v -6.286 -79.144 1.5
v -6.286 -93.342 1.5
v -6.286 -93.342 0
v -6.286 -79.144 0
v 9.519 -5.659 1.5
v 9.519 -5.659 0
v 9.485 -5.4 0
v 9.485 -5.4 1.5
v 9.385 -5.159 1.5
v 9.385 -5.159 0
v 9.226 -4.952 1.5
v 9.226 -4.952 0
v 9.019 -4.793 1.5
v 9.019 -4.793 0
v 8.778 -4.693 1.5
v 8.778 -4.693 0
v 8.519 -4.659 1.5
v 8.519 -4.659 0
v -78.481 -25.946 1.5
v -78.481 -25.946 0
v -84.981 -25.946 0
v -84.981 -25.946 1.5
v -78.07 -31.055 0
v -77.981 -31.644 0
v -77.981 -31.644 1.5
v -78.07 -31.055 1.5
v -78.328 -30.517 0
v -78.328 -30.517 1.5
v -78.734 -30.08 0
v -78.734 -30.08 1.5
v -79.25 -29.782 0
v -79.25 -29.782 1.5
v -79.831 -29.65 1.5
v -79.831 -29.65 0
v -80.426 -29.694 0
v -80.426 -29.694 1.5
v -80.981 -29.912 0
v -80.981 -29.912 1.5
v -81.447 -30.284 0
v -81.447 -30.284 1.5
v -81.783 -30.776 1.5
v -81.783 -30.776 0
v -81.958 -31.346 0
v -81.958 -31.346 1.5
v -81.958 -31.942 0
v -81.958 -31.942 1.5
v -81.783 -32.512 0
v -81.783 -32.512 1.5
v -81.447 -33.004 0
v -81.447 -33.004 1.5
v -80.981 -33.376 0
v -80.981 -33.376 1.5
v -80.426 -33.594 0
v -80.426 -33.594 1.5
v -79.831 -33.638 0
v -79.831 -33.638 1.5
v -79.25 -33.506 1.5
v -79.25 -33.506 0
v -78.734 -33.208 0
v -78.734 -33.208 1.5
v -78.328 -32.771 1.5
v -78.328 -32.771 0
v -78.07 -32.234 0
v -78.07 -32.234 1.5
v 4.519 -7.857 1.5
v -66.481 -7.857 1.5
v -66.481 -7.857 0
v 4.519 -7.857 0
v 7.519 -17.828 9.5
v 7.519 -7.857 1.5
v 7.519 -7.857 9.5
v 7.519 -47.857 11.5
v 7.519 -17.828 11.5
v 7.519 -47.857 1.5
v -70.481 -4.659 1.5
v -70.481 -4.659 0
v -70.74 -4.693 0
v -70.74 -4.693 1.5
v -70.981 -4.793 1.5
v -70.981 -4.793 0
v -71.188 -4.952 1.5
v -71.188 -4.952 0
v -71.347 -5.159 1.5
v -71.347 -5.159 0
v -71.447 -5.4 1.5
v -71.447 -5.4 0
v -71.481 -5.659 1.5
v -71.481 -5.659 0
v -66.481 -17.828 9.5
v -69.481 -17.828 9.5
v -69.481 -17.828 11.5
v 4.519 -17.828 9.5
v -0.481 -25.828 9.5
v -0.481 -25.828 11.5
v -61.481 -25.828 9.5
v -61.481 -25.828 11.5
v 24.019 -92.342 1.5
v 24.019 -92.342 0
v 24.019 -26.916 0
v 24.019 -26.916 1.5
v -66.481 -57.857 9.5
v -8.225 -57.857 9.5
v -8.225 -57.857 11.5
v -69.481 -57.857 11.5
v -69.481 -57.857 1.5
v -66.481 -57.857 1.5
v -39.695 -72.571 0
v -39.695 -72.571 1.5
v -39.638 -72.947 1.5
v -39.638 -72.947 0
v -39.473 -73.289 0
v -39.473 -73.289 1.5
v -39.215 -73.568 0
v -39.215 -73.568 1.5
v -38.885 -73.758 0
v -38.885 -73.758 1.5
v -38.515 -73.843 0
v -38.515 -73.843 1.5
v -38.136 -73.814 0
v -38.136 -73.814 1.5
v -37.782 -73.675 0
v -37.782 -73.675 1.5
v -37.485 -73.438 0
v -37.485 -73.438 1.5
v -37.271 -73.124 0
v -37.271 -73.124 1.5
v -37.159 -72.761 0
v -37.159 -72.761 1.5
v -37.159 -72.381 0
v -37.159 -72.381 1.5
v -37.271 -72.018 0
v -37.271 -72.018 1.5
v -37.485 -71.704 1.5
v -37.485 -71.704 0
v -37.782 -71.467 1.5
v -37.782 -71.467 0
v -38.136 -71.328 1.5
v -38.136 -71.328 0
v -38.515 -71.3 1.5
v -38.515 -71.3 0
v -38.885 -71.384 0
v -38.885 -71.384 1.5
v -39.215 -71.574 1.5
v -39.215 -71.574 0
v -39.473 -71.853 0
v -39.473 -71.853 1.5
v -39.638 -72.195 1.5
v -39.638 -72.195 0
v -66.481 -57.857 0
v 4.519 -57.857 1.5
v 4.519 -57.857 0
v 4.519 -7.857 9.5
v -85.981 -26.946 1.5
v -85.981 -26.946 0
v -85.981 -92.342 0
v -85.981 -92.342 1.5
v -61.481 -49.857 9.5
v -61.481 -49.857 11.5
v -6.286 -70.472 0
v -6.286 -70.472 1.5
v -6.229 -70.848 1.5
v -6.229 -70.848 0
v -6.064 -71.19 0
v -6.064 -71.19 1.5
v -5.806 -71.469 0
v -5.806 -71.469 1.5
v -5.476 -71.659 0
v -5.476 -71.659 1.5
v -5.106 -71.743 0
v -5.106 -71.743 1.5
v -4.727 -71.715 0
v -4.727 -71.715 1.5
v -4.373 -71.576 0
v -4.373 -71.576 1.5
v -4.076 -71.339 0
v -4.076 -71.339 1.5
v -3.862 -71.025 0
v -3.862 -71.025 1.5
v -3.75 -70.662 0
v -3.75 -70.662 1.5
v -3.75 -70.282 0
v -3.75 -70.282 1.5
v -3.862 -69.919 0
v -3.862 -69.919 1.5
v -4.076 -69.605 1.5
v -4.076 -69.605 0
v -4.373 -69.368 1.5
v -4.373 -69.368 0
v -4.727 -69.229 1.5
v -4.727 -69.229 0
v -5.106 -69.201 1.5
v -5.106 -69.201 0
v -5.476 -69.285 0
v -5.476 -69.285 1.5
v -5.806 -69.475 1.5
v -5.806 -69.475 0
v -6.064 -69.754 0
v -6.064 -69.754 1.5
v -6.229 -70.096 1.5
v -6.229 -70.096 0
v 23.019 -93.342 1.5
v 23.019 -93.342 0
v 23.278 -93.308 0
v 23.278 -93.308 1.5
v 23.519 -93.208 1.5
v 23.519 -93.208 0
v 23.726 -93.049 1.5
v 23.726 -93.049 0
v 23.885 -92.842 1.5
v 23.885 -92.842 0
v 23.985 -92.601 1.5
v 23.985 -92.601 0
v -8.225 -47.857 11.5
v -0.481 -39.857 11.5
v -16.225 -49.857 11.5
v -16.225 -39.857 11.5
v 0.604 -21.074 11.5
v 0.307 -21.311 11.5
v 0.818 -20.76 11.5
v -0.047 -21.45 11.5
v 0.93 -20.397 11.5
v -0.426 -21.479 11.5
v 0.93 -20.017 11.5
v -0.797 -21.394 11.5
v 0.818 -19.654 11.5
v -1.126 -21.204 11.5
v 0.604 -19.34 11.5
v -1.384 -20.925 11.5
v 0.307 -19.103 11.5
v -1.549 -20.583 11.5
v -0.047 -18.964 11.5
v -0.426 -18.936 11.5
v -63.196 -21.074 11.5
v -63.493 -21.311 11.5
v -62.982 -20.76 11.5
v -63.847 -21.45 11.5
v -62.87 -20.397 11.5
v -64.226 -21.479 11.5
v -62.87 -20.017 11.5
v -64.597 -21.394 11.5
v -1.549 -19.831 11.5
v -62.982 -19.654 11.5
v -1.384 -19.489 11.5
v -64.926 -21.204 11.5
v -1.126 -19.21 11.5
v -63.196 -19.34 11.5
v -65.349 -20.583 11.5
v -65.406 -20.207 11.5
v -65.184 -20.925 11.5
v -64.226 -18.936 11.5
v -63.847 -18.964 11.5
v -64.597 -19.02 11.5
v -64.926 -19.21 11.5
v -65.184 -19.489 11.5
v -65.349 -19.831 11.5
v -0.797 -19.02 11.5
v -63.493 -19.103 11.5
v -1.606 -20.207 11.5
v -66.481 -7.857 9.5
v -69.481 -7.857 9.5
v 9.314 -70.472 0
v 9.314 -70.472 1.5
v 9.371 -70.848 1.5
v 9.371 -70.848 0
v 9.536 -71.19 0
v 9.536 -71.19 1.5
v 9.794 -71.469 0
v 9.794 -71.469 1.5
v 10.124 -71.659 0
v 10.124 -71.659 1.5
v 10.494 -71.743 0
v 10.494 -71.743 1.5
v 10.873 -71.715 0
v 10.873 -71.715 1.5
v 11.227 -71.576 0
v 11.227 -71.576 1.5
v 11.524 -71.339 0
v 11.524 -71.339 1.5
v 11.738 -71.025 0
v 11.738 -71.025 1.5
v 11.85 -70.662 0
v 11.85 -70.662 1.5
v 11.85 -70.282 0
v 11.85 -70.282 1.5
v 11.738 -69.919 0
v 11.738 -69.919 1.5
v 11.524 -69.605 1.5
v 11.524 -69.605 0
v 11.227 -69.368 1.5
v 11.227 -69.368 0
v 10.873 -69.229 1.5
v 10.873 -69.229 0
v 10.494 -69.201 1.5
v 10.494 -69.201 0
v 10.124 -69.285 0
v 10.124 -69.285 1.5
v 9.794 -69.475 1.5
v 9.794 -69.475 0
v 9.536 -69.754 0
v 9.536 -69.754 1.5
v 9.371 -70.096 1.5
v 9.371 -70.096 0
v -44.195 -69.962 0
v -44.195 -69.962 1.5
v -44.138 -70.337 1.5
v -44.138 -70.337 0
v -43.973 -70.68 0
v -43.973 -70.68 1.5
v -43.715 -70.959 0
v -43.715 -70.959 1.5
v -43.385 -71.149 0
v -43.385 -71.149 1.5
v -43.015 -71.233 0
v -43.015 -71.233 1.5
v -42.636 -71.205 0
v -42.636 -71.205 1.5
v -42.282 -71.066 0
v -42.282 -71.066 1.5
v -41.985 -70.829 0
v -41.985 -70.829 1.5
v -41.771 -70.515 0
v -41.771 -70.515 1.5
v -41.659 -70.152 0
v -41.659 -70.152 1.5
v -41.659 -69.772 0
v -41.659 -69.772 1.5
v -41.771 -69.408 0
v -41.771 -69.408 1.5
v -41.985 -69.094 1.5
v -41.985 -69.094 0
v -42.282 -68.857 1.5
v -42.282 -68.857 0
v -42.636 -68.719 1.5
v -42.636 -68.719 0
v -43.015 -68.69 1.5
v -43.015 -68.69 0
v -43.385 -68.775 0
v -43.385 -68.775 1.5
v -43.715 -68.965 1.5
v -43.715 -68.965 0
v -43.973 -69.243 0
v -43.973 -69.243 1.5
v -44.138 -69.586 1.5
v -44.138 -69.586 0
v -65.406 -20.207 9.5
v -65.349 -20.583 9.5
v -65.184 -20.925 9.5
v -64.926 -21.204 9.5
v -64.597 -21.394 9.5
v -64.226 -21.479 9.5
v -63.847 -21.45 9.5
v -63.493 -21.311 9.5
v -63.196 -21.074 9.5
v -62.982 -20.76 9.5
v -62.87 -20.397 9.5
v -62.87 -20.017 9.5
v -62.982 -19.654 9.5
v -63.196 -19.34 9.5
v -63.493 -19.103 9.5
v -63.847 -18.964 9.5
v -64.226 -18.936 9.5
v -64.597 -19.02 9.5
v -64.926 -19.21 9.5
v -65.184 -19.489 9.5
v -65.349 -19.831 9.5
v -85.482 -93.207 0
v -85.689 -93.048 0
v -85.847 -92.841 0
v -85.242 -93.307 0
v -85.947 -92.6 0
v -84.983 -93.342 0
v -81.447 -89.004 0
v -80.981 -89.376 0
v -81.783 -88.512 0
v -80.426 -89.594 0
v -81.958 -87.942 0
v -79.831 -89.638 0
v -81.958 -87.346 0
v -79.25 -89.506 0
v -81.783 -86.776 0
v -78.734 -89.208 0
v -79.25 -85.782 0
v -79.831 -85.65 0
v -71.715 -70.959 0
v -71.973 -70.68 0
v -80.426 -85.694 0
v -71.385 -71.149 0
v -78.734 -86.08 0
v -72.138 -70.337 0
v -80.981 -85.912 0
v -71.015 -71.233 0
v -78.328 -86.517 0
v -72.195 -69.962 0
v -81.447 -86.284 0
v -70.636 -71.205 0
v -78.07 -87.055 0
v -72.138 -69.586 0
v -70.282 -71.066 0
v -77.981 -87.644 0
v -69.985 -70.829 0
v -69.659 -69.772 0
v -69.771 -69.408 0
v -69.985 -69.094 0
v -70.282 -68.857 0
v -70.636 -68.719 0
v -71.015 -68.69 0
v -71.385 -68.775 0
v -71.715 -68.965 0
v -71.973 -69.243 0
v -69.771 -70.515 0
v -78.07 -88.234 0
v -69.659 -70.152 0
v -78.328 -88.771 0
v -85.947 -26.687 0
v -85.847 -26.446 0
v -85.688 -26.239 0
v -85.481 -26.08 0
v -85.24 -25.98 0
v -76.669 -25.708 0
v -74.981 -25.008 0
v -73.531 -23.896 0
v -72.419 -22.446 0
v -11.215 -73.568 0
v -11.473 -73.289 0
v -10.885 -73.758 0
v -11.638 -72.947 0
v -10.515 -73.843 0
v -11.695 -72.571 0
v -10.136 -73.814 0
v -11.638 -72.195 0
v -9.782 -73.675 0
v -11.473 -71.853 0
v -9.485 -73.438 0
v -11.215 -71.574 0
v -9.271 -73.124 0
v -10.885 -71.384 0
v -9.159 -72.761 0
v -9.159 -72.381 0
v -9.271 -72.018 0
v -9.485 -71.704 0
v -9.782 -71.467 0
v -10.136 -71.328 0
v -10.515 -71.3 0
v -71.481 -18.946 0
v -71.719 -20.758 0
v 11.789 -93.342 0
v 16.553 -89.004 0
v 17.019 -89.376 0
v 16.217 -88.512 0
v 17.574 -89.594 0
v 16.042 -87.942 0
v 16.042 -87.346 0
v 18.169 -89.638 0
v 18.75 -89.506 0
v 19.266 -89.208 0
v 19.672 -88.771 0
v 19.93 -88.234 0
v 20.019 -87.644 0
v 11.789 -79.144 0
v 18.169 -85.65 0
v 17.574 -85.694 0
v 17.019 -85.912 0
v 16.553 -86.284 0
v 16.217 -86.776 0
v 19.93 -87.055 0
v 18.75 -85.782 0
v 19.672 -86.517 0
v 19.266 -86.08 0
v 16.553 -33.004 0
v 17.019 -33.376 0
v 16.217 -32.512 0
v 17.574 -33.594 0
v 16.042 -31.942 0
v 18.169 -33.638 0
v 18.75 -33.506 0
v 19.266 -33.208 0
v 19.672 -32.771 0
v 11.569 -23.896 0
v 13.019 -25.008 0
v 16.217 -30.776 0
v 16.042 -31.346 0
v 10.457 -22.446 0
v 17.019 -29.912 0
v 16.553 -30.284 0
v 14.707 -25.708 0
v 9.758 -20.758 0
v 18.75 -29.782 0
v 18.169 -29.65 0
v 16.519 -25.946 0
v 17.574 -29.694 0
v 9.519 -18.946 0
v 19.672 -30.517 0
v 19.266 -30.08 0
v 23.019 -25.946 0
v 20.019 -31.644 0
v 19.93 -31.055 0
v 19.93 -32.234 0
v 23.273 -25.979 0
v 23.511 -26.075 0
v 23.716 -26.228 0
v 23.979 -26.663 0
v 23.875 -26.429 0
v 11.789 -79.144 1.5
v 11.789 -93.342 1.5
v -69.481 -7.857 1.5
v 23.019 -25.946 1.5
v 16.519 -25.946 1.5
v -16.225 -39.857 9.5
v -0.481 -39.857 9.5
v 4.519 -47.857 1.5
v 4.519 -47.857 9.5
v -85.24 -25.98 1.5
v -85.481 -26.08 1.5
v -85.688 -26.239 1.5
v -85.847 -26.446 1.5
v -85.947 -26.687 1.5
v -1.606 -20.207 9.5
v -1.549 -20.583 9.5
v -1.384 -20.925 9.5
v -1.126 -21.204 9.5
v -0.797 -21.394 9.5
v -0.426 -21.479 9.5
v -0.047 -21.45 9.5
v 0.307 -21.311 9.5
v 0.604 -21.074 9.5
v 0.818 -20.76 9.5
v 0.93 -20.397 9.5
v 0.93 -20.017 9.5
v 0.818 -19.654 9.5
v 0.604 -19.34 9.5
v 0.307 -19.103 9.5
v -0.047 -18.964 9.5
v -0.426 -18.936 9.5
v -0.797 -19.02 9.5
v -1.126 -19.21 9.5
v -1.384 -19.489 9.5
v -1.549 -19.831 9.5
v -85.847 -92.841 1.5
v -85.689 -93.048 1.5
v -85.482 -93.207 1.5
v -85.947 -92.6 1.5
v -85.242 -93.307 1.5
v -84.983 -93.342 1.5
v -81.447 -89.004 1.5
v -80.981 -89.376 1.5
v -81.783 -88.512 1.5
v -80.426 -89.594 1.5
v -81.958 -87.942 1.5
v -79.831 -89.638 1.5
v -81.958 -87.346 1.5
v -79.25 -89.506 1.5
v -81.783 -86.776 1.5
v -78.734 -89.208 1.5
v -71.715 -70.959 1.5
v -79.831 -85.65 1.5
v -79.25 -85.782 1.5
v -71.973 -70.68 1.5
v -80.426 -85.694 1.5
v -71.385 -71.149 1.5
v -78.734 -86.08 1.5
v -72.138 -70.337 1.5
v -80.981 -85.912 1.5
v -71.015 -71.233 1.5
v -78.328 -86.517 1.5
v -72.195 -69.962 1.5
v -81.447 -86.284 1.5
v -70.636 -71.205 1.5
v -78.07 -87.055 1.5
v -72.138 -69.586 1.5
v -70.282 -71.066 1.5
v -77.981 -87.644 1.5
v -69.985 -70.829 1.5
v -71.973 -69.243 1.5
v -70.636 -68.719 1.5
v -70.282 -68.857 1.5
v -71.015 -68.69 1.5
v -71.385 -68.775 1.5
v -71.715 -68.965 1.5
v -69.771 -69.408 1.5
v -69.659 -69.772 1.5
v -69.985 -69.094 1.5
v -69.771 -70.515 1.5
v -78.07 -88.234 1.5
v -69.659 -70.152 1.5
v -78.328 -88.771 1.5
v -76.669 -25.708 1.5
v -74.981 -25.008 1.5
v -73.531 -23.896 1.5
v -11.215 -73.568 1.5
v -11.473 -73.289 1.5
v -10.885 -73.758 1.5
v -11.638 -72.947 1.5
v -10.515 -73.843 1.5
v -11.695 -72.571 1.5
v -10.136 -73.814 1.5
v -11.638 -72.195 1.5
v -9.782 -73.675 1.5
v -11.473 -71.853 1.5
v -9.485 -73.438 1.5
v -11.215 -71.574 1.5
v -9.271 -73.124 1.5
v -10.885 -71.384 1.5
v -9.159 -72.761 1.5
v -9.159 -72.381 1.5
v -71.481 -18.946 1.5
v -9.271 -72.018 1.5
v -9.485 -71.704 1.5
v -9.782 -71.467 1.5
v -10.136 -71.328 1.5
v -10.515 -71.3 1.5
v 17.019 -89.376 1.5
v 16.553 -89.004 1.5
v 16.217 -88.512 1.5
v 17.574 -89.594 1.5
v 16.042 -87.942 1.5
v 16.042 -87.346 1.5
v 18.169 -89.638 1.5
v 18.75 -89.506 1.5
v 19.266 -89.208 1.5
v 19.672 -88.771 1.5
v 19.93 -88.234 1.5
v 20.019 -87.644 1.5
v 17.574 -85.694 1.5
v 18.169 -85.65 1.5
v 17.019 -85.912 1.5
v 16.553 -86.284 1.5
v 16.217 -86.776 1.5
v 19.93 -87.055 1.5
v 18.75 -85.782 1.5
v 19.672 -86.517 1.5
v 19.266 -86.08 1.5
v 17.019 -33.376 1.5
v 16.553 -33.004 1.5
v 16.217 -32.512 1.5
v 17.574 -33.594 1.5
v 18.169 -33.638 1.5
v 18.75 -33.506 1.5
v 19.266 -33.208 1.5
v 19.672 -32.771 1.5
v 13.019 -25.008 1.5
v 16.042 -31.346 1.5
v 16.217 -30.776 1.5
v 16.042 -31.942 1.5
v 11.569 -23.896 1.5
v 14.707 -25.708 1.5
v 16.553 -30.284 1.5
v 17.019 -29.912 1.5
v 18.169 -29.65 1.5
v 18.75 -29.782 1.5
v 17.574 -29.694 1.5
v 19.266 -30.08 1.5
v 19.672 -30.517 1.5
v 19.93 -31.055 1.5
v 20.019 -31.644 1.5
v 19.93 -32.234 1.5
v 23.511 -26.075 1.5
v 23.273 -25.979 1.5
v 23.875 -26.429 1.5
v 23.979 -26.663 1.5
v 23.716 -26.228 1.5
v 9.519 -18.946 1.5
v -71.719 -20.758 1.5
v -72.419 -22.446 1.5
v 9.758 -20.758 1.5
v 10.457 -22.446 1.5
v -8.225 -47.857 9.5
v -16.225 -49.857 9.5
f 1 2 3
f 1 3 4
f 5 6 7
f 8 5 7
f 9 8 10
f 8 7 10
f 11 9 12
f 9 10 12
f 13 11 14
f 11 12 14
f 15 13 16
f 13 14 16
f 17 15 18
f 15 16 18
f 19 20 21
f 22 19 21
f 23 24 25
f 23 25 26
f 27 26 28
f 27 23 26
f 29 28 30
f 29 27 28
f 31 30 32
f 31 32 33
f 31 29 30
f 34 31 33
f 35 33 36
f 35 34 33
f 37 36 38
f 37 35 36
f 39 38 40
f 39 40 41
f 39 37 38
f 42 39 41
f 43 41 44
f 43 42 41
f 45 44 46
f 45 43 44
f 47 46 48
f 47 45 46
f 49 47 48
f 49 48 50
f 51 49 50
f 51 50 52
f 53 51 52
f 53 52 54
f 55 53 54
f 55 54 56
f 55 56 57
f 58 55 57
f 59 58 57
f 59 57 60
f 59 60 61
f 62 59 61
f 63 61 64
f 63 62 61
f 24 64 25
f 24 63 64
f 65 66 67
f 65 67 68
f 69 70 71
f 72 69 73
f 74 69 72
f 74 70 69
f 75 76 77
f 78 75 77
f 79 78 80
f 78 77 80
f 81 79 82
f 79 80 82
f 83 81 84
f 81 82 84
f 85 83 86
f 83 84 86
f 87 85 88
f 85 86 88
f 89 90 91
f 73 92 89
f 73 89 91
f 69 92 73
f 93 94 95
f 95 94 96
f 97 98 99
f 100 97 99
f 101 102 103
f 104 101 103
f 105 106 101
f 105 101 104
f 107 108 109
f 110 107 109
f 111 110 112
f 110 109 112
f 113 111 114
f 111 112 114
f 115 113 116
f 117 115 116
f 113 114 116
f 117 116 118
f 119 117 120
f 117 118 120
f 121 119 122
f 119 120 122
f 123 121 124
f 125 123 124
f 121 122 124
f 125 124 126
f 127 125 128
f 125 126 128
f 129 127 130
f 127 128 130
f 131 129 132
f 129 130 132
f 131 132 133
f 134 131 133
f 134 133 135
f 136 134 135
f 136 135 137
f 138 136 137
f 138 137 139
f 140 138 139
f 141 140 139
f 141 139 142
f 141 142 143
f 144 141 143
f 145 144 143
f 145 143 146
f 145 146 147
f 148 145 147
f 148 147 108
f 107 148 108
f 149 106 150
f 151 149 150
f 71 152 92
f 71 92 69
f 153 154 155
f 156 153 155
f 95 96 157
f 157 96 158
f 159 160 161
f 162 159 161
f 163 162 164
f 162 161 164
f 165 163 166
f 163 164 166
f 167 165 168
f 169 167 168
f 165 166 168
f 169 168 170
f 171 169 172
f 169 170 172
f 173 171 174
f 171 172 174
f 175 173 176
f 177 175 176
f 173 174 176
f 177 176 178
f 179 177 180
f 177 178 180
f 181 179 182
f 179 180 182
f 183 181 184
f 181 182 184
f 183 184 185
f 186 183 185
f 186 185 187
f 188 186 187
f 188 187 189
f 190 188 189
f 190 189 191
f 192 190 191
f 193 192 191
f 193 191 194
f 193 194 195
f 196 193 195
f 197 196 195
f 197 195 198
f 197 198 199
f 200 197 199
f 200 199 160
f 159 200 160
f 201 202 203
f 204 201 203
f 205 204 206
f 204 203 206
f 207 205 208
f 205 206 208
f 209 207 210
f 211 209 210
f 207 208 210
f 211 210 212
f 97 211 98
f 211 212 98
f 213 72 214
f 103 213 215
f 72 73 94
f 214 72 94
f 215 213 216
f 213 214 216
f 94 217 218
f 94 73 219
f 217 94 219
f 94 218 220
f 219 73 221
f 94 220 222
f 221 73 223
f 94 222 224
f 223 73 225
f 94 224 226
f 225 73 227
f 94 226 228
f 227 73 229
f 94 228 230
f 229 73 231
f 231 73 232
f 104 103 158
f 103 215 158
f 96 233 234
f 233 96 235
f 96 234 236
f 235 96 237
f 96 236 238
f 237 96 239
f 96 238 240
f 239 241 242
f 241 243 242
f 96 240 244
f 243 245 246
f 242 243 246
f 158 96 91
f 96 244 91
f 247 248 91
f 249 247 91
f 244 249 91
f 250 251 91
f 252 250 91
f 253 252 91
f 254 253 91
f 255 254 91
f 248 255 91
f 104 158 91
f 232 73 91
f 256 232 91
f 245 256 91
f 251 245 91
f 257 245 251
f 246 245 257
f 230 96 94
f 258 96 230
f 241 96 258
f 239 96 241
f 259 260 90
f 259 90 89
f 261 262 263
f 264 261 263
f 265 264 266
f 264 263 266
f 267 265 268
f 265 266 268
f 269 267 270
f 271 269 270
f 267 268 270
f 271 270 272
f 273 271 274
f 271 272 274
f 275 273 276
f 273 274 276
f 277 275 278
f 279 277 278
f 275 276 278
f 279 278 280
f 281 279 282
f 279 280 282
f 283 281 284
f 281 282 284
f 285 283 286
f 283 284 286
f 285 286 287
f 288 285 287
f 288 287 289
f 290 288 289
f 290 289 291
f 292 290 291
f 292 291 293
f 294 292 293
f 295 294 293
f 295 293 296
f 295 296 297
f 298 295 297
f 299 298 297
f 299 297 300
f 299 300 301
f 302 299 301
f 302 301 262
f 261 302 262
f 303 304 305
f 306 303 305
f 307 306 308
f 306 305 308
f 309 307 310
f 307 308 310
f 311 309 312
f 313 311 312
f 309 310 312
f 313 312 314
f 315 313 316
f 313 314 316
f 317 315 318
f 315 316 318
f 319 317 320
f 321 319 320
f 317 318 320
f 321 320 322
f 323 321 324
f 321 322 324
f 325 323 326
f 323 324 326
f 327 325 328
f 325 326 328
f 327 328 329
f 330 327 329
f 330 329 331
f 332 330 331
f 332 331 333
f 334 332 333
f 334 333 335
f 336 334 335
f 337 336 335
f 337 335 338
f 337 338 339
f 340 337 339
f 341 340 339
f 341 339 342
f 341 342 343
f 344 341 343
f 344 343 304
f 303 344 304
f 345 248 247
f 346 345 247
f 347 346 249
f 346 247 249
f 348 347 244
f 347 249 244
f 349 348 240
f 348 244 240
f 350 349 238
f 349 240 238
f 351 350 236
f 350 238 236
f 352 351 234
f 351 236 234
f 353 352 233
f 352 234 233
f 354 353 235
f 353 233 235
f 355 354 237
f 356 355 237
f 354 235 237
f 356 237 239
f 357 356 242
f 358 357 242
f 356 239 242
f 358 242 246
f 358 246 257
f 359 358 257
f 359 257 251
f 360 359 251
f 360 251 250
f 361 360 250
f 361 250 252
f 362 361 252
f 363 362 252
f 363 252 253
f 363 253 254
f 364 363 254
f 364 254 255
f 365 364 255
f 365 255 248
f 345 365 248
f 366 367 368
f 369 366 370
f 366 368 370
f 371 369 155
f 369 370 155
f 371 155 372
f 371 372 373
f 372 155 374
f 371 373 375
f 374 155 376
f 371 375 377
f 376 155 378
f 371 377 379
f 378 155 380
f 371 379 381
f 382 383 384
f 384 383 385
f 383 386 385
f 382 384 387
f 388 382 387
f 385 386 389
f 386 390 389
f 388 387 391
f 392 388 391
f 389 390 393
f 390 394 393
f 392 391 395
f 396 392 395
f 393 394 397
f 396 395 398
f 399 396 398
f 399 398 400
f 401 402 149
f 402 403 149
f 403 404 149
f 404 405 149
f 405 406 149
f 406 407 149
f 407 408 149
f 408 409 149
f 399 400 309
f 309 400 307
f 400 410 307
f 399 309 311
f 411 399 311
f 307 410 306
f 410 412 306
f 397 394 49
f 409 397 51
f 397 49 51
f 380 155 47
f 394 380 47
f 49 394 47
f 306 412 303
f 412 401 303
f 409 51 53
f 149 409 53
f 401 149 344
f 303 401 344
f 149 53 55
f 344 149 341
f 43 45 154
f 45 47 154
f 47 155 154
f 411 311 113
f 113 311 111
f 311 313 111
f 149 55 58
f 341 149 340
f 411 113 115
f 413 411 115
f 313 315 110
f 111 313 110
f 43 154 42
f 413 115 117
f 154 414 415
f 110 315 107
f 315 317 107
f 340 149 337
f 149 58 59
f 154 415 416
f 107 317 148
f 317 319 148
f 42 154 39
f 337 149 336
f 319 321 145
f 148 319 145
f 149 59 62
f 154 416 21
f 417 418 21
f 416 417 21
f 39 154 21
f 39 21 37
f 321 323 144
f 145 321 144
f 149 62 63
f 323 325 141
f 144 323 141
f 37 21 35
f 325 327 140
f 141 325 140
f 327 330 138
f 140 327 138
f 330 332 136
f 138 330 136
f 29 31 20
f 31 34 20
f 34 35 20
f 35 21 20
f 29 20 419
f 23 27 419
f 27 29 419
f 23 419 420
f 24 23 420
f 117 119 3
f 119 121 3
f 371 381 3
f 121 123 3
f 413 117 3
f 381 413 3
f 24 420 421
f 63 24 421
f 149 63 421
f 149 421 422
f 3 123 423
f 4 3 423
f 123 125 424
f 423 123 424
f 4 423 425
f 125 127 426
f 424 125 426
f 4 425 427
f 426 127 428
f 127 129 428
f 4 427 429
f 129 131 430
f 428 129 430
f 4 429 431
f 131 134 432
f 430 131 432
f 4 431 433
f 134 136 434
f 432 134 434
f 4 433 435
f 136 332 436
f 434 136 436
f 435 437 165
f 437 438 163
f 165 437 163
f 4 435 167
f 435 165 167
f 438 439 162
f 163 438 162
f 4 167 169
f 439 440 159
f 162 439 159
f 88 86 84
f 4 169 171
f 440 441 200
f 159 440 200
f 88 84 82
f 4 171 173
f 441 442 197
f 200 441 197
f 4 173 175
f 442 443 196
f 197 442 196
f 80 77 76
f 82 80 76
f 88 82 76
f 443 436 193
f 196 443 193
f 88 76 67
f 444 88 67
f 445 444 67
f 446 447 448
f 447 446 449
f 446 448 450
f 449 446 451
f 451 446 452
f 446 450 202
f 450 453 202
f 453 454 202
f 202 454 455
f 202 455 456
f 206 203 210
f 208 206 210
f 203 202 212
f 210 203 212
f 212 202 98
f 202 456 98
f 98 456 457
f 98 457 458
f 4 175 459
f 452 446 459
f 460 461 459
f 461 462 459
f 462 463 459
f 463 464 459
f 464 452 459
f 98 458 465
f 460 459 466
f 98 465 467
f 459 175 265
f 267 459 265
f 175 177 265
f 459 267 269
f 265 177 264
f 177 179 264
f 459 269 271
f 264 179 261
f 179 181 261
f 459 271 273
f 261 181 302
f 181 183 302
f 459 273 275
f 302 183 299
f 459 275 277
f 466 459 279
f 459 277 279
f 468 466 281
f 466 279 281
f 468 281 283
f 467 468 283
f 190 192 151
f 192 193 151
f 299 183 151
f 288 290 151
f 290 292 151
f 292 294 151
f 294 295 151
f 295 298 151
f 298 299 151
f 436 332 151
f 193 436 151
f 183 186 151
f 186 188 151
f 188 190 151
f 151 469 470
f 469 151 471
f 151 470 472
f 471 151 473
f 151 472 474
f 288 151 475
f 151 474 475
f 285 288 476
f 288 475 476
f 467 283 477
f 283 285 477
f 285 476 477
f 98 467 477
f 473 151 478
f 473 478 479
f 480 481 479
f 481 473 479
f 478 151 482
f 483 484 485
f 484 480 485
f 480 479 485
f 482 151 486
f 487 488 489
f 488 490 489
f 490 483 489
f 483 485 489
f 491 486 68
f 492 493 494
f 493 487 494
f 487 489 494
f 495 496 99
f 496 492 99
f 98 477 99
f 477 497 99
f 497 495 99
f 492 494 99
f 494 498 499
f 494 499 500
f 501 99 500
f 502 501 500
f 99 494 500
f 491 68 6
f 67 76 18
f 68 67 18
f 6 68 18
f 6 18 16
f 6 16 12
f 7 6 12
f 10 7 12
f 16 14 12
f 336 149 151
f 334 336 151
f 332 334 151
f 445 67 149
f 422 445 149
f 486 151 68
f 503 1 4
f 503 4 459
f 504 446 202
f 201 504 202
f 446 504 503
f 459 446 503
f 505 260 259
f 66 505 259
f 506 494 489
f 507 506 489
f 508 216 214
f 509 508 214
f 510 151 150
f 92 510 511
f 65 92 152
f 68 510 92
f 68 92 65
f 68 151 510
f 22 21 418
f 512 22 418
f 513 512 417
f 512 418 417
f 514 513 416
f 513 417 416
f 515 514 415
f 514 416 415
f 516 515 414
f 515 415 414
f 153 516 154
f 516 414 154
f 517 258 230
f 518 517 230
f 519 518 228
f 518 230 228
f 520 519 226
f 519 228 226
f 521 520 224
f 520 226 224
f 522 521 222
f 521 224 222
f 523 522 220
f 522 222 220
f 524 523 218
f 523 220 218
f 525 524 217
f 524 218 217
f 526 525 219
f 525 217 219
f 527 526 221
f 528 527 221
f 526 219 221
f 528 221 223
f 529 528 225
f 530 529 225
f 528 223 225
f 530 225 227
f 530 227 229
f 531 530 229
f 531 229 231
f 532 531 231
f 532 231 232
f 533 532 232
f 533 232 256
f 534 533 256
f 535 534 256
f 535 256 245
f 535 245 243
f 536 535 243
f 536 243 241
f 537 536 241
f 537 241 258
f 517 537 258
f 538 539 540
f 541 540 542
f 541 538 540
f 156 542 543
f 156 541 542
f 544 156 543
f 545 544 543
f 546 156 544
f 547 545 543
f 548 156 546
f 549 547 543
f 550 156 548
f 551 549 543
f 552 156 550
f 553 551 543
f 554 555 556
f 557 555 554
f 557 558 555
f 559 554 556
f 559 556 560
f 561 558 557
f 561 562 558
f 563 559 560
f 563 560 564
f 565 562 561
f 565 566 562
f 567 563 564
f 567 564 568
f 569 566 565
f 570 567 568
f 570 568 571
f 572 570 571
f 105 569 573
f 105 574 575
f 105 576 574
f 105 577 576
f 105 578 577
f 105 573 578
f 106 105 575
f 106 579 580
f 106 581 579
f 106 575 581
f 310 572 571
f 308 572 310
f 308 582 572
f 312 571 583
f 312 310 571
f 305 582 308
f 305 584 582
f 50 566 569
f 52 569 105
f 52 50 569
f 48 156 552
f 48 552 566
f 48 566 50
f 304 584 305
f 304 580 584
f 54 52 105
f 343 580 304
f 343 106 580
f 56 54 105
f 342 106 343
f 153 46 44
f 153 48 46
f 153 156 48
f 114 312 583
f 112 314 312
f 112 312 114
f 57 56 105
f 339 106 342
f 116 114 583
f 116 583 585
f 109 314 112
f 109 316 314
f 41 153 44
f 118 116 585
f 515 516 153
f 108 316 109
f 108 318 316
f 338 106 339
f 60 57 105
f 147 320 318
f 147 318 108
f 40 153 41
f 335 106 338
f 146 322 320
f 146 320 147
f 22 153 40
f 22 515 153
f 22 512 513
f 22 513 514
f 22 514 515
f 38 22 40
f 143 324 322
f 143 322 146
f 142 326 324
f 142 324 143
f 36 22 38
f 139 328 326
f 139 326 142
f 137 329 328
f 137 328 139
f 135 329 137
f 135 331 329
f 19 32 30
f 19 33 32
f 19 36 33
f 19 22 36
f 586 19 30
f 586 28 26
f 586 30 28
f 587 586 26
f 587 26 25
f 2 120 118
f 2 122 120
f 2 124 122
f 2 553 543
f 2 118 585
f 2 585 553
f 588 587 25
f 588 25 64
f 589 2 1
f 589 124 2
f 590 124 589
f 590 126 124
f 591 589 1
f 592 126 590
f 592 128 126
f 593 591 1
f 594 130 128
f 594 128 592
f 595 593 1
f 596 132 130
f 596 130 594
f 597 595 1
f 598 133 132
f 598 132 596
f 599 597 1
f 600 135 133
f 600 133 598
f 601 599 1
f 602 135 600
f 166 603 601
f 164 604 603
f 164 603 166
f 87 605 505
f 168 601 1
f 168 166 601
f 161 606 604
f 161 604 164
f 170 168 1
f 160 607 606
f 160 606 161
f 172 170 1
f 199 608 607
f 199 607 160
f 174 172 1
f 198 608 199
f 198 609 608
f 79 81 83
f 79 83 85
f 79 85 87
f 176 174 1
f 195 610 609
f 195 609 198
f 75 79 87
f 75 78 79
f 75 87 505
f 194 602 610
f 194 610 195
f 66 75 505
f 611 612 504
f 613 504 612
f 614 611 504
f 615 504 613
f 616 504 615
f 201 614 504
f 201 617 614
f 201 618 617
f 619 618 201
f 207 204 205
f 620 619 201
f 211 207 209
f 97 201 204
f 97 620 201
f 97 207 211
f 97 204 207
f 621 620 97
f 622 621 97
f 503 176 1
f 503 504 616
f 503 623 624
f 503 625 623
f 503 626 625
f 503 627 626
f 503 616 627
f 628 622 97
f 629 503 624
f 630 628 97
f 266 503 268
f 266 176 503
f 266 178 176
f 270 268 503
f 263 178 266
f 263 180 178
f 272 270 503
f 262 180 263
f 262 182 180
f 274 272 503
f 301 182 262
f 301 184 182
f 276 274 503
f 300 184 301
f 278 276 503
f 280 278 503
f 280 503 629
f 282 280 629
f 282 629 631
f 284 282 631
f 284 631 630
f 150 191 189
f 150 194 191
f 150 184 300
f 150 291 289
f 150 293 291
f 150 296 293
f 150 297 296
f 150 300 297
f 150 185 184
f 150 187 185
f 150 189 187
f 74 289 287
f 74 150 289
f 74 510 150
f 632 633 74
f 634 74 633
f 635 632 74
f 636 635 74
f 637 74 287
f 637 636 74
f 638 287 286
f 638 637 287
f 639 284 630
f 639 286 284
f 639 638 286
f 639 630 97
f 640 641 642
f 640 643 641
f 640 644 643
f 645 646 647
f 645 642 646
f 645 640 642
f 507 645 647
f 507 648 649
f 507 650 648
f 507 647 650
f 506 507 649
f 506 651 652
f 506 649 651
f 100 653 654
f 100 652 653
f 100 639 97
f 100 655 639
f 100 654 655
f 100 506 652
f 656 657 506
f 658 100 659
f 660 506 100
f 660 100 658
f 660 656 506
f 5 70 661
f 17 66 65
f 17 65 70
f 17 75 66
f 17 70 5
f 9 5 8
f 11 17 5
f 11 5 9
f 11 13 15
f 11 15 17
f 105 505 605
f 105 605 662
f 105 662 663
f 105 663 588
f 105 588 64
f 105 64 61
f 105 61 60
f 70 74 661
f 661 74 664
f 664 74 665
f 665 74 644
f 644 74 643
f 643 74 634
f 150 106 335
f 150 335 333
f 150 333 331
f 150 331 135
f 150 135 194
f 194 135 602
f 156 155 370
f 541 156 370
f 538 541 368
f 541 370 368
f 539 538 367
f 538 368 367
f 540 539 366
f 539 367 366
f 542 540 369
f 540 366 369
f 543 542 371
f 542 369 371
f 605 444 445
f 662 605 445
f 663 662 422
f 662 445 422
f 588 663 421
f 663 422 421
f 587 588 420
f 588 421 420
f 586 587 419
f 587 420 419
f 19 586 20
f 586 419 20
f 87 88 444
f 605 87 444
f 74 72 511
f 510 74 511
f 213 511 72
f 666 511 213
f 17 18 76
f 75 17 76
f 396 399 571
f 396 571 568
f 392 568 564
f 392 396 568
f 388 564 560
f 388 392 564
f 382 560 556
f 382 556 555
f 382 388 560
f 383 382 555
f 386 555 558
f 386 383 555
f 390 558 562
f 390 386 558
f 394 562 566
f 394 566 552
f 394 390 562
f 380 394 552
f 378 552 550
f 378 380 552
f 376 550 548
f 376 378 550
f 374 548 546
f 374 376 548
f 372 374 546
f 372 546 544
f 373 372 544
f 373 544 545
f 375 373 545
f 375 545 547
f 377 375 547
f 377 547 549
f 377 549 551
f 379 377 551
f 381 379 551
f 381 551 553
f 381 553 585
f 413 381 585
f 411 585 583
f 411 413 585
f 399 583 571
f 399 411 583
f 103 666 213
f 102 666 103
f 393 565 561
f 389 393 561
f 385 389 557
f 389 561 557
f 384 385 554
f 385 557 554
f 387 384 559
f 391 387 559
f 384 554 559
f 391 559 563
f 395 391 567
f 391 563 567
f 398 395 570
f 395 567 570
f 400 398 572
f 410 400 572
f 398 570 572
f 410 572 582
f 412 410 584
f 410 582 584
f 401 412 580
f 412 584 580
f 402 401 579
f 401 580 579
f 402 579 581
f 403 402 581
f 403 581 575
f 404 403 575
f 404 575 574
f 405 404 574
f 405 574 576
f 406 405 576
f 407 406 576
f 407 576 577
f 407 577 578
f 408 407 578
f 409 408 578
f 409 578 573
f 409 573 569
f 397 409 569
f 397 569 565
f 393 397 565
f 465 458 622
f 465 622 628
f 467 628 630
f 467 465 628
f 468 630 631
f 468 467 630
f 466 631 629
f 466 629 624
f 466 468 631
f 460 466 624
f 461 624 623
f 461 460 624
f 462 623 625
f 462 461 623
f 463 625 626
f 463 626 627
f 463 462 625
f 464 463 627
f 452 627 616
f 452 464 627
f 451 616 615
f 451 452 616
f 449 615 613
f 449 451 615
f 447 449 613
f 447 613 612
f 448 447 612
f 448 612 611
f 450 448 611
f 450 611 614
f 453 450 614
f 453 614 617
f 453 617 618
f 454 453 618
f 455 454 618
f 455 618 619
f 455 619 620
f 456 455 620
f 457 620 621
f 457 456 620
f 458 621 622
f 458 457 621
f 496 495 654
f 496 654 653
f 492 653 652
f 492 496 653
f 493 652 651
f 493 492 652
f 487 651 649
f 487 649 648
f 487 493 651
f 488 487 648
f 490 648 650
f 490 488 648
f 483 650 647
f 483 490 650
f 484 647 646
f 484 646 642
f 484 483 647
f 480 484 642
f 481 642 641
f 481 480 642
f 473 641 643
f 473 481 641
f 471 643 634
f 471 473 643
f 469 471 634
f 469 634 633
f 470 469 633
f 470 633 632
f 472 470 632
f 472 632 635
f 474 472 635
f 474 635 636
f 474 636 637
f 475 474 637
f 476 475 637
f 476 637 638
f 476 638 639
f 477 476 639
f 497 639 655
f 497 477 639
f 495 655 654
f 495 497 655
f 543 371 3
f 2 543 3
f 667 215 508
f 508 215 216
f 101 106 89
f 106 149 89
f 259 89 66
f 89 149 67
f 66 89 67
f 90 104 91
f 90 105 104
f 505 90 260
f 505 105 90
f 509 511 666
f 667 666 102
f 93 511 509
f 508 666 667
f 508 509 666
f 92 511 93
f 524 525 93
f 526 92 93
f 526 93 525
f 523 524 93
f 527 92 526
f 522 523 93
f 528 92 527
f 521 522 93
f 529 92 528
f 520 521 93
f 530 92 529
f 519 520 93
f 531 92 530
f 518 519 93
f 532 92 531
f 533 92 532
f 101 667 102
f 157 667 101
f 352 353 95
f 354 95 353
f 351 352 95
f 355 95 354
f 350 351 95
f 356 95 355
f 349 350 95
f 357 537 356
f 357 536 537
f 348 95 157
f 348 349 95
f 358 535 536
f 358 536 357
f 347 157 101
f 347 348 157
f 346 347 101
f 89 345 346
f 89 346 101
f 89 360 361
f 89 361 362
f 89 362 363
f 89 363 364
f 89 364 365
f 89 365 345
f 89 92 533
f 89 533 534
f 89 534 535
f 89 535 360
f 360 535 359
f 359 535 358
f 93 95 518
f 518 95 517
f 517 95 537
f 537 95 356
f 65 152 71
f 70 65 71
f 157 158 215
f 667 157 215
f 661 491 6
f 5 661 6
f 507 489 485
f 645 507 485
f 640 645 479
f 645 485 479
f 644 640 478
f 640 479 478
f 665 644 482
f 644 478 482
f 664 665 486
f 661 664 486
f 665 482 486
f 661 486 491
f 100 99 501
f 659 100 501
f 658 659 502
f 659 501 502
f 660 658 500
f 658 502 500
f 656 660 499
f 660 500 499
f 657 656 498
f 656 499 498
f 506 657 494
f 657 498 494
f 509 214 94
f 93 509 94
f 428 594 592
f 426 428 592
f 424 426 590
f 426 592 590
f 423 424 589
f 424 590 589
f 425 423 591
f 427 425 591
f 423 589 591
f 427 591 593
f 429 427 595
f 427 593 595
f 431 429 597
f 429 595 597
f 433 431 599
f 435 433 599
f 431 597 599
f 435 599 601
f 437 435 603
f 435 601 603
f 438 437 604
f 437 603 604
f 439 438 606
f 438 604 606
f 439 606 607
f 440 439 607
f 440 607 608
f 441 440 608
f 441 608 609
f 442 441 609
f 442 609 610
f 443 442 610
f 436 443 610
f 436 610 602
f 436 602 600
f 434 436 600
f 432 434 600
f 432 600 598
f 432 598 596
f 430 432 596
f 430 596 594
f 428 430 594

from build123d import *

# Parameters (mm, degrees)
SKETCH_1_R           = 2
EXTRUDE_1_DEPTH      = 1.5
SKETCH_2_W           = 3
SKETCH_2_H           = 50
SKETCH_2_H_2         = 40
EXTRUDE_3_DEPTH      = 8
EXTRUDE_4_DEPTH      = 2
SKETCH_4_W           = 71.000000198
SKETCH_4_H           = 50
CUT_EXTRUDE_1_DEPTH  = 128.300477144
CUT_EXTRUDE_3_DEPTH  = 128.427082997
SKETCH_11_W          = 18.075
SKETCH_11_H          = 14.197672296
CUT_EXTRUDE_4_DEPTH  = 128.300477144
HOLE_WIZARD_M2_5_1_D = 2.55


with BuildPart() as part:
    # 草圖1 → 填料-伸長1 (new body)
    with BuildSketch(Plane.XY):
        with BuildLine():
            Line((-78.58357781, -93.341907955), (16.519190028, -93.341907955))
            Line((16.519190028, -93.341907955), (23.019189929, -93.341907955))
            ThreePointArc((23.019189929, -93.341907955), (23.72629671, -93.049014736), (24.019189929, -92.341907955))
            Line((24.019189929, -92.341907955), (24.019189929, -26.916101175))
            ThreePointArc((24.019189929, -26.916101175), (23.715868617, -26.228364762), (23.019189929, -25.946187519))
            Line((23.019189929, -25.946187519), (16.519190028, -25.946187519))
            ThreePointArc((16.519190028, -25.946187519), (11.569442559, -23.895934988), (9.519190028, -18.946187519))
            Line((9.519190028, -18.946187519), (9.519190028, -5.659090909))
            ThreePointArc((9.519190028, -5.659090909), (9.226296809, -4.951984128), (8.519190028, -4.659090909))
            Line((8.519190028, -4.659090909), (-70.48081017, -4.659090909))
            ThreePointArc((-70.48081017, -4.659090909), (-71.187916951, -4.951984128), (-71.48081017, -5.659090909))
            Line((-71.48081017, -5.659090909), (-71.48081017, -18.946187519))
            ThreePointArc((-71.48081017, -18.946187519), (-73.531062702, -23.895934988), (-78.48081017, -25.946187519))
            Line((-78.48081017, -25.946187519), (-84.980810071, -25.946187519))
            ThreePointArc((-84.980810071, -25.946187519), (-85.687916853, -26.239080738), (-85.980810071, -26.946187519))
            Line((-85.980810071, -26.946187519), (-85.980810071, -92.341911374))
            ThreePointArc((-85.980810071, -92.341911374), (-85.688840793, -93.048093006), (-84.983425077, -93.341907955))
            Line((-84.983425077, -93.341907955), (-78.58357781, -93.341907955))
        make_face()
        with Locations((-79.980810071, -31.644049447)):
            Circle(SKETCH_1_R, mode=Mode.SUBTRACT)
        with Locations((18.019189929, -31.644049447)):
            Circle(SKETCH_1_R, mode=Mode.SUBTRACT)
        with Locations((18.019189929, -87.644049447)):
            Circle(SKETCH_1_R, mode=Mode.SUBTRACT)
        with Locations((-79.980810071, -87.644049447)):
            Circle(SKETCH_1_R, mode=Mode.SUBTRACT)
    extrude(amount=EXTRUDE_1_DEPTH)

    # 草圖2 → 填料-伸長3 (add)
    with BuildSketch(Plane.XY.offset(1.5)):
        with Locations((-67.98081017, -32.85713984)):
            Rectangle(SKETCH_2_W, SKETCH_2_H)
        with Locations((6.019190028, -27.85713984)):
            Rectangle(SKETCH_2_W, SKETCH_2_H_2)
    extrude(amount=EXTRUDE_3_DEPTH)

    # 草圖3 → 填料-伸長4 (add)
    with BuildSketch(Plane.XY.offset(9.5)):
        Polygon((-69.48081017, -17.828011501), (7.519190028, -17.828011501), (7.519190028, -47.85713984), (-8.225095928, -47.85713984), (-8.225095928, -57.85713984), (-69.48081017, -57.85713984), align=None)
    extrude(amount=EXTRUDE_4_DEPTH)

    # 草圖4 → 除料-伸長1 (cut, through all)
    with BuildSketch(Plane.XY.offset(1.5)):
        with Locations((-30.980810071, -32.85713984)):
            Rectangle(SKETCH_4_W, SKETCH_4_H)
    extrude(amount=-CUT_EXTRUDE_1_DEPTH, mode=Mode.SUBTRACT)

    # 草圖7 → 除料-伸長3 (cut, through all)
    with BuildSketch(Plane.XY.offset(11.5)):
        Polygon((-16.225095928, -49.85713984), (-16.225095928, -39.85713984), (-0.480809972, -39.85713984), (-0.480809972, -25.828011501), (-61.48081017, -25.828011501), (-61.48081017, -49.85713984), align=None)
    extrude(amount=-CUT_EXTRUDE_3_DEPTH, mode=Mode.SUBTRACT)

    # 草圖11 → 除料-伸長4 (cut, through all)
    with BuildSketch(Plane.XY.offset(1.5)):
        with Locations((2.751904461, -86.243071807)):
            Rectangle(SKETCH_11_W, SKETCH_11_H)
    extrude(amount=-CUT_EXTRUDE_4_DEPTH, mode=Mode.SUBTRACT)

    # M2.5 螺旋的螺孔鑽1 (through all)
    with Locations(Plane(origin=(0, 0, 0), x_dir=(1, 0, 0), z_dir=(0, 0, -1))):
        with Locations((-64.13081017, 20.20713984), (-0.33081017, 20.20713984), (10.589404461, 70.471994299), (-5.010595539, 70.471994299), (-10.419668394, 72.571170345), (-38.419668394, 72.571170345), (-42.919668394, 69.961668418), (-70.919668394, 69.961668418)):
            Hole(HOLE_WIZARD_M2_5_1_D / 2)


solid = part.part
